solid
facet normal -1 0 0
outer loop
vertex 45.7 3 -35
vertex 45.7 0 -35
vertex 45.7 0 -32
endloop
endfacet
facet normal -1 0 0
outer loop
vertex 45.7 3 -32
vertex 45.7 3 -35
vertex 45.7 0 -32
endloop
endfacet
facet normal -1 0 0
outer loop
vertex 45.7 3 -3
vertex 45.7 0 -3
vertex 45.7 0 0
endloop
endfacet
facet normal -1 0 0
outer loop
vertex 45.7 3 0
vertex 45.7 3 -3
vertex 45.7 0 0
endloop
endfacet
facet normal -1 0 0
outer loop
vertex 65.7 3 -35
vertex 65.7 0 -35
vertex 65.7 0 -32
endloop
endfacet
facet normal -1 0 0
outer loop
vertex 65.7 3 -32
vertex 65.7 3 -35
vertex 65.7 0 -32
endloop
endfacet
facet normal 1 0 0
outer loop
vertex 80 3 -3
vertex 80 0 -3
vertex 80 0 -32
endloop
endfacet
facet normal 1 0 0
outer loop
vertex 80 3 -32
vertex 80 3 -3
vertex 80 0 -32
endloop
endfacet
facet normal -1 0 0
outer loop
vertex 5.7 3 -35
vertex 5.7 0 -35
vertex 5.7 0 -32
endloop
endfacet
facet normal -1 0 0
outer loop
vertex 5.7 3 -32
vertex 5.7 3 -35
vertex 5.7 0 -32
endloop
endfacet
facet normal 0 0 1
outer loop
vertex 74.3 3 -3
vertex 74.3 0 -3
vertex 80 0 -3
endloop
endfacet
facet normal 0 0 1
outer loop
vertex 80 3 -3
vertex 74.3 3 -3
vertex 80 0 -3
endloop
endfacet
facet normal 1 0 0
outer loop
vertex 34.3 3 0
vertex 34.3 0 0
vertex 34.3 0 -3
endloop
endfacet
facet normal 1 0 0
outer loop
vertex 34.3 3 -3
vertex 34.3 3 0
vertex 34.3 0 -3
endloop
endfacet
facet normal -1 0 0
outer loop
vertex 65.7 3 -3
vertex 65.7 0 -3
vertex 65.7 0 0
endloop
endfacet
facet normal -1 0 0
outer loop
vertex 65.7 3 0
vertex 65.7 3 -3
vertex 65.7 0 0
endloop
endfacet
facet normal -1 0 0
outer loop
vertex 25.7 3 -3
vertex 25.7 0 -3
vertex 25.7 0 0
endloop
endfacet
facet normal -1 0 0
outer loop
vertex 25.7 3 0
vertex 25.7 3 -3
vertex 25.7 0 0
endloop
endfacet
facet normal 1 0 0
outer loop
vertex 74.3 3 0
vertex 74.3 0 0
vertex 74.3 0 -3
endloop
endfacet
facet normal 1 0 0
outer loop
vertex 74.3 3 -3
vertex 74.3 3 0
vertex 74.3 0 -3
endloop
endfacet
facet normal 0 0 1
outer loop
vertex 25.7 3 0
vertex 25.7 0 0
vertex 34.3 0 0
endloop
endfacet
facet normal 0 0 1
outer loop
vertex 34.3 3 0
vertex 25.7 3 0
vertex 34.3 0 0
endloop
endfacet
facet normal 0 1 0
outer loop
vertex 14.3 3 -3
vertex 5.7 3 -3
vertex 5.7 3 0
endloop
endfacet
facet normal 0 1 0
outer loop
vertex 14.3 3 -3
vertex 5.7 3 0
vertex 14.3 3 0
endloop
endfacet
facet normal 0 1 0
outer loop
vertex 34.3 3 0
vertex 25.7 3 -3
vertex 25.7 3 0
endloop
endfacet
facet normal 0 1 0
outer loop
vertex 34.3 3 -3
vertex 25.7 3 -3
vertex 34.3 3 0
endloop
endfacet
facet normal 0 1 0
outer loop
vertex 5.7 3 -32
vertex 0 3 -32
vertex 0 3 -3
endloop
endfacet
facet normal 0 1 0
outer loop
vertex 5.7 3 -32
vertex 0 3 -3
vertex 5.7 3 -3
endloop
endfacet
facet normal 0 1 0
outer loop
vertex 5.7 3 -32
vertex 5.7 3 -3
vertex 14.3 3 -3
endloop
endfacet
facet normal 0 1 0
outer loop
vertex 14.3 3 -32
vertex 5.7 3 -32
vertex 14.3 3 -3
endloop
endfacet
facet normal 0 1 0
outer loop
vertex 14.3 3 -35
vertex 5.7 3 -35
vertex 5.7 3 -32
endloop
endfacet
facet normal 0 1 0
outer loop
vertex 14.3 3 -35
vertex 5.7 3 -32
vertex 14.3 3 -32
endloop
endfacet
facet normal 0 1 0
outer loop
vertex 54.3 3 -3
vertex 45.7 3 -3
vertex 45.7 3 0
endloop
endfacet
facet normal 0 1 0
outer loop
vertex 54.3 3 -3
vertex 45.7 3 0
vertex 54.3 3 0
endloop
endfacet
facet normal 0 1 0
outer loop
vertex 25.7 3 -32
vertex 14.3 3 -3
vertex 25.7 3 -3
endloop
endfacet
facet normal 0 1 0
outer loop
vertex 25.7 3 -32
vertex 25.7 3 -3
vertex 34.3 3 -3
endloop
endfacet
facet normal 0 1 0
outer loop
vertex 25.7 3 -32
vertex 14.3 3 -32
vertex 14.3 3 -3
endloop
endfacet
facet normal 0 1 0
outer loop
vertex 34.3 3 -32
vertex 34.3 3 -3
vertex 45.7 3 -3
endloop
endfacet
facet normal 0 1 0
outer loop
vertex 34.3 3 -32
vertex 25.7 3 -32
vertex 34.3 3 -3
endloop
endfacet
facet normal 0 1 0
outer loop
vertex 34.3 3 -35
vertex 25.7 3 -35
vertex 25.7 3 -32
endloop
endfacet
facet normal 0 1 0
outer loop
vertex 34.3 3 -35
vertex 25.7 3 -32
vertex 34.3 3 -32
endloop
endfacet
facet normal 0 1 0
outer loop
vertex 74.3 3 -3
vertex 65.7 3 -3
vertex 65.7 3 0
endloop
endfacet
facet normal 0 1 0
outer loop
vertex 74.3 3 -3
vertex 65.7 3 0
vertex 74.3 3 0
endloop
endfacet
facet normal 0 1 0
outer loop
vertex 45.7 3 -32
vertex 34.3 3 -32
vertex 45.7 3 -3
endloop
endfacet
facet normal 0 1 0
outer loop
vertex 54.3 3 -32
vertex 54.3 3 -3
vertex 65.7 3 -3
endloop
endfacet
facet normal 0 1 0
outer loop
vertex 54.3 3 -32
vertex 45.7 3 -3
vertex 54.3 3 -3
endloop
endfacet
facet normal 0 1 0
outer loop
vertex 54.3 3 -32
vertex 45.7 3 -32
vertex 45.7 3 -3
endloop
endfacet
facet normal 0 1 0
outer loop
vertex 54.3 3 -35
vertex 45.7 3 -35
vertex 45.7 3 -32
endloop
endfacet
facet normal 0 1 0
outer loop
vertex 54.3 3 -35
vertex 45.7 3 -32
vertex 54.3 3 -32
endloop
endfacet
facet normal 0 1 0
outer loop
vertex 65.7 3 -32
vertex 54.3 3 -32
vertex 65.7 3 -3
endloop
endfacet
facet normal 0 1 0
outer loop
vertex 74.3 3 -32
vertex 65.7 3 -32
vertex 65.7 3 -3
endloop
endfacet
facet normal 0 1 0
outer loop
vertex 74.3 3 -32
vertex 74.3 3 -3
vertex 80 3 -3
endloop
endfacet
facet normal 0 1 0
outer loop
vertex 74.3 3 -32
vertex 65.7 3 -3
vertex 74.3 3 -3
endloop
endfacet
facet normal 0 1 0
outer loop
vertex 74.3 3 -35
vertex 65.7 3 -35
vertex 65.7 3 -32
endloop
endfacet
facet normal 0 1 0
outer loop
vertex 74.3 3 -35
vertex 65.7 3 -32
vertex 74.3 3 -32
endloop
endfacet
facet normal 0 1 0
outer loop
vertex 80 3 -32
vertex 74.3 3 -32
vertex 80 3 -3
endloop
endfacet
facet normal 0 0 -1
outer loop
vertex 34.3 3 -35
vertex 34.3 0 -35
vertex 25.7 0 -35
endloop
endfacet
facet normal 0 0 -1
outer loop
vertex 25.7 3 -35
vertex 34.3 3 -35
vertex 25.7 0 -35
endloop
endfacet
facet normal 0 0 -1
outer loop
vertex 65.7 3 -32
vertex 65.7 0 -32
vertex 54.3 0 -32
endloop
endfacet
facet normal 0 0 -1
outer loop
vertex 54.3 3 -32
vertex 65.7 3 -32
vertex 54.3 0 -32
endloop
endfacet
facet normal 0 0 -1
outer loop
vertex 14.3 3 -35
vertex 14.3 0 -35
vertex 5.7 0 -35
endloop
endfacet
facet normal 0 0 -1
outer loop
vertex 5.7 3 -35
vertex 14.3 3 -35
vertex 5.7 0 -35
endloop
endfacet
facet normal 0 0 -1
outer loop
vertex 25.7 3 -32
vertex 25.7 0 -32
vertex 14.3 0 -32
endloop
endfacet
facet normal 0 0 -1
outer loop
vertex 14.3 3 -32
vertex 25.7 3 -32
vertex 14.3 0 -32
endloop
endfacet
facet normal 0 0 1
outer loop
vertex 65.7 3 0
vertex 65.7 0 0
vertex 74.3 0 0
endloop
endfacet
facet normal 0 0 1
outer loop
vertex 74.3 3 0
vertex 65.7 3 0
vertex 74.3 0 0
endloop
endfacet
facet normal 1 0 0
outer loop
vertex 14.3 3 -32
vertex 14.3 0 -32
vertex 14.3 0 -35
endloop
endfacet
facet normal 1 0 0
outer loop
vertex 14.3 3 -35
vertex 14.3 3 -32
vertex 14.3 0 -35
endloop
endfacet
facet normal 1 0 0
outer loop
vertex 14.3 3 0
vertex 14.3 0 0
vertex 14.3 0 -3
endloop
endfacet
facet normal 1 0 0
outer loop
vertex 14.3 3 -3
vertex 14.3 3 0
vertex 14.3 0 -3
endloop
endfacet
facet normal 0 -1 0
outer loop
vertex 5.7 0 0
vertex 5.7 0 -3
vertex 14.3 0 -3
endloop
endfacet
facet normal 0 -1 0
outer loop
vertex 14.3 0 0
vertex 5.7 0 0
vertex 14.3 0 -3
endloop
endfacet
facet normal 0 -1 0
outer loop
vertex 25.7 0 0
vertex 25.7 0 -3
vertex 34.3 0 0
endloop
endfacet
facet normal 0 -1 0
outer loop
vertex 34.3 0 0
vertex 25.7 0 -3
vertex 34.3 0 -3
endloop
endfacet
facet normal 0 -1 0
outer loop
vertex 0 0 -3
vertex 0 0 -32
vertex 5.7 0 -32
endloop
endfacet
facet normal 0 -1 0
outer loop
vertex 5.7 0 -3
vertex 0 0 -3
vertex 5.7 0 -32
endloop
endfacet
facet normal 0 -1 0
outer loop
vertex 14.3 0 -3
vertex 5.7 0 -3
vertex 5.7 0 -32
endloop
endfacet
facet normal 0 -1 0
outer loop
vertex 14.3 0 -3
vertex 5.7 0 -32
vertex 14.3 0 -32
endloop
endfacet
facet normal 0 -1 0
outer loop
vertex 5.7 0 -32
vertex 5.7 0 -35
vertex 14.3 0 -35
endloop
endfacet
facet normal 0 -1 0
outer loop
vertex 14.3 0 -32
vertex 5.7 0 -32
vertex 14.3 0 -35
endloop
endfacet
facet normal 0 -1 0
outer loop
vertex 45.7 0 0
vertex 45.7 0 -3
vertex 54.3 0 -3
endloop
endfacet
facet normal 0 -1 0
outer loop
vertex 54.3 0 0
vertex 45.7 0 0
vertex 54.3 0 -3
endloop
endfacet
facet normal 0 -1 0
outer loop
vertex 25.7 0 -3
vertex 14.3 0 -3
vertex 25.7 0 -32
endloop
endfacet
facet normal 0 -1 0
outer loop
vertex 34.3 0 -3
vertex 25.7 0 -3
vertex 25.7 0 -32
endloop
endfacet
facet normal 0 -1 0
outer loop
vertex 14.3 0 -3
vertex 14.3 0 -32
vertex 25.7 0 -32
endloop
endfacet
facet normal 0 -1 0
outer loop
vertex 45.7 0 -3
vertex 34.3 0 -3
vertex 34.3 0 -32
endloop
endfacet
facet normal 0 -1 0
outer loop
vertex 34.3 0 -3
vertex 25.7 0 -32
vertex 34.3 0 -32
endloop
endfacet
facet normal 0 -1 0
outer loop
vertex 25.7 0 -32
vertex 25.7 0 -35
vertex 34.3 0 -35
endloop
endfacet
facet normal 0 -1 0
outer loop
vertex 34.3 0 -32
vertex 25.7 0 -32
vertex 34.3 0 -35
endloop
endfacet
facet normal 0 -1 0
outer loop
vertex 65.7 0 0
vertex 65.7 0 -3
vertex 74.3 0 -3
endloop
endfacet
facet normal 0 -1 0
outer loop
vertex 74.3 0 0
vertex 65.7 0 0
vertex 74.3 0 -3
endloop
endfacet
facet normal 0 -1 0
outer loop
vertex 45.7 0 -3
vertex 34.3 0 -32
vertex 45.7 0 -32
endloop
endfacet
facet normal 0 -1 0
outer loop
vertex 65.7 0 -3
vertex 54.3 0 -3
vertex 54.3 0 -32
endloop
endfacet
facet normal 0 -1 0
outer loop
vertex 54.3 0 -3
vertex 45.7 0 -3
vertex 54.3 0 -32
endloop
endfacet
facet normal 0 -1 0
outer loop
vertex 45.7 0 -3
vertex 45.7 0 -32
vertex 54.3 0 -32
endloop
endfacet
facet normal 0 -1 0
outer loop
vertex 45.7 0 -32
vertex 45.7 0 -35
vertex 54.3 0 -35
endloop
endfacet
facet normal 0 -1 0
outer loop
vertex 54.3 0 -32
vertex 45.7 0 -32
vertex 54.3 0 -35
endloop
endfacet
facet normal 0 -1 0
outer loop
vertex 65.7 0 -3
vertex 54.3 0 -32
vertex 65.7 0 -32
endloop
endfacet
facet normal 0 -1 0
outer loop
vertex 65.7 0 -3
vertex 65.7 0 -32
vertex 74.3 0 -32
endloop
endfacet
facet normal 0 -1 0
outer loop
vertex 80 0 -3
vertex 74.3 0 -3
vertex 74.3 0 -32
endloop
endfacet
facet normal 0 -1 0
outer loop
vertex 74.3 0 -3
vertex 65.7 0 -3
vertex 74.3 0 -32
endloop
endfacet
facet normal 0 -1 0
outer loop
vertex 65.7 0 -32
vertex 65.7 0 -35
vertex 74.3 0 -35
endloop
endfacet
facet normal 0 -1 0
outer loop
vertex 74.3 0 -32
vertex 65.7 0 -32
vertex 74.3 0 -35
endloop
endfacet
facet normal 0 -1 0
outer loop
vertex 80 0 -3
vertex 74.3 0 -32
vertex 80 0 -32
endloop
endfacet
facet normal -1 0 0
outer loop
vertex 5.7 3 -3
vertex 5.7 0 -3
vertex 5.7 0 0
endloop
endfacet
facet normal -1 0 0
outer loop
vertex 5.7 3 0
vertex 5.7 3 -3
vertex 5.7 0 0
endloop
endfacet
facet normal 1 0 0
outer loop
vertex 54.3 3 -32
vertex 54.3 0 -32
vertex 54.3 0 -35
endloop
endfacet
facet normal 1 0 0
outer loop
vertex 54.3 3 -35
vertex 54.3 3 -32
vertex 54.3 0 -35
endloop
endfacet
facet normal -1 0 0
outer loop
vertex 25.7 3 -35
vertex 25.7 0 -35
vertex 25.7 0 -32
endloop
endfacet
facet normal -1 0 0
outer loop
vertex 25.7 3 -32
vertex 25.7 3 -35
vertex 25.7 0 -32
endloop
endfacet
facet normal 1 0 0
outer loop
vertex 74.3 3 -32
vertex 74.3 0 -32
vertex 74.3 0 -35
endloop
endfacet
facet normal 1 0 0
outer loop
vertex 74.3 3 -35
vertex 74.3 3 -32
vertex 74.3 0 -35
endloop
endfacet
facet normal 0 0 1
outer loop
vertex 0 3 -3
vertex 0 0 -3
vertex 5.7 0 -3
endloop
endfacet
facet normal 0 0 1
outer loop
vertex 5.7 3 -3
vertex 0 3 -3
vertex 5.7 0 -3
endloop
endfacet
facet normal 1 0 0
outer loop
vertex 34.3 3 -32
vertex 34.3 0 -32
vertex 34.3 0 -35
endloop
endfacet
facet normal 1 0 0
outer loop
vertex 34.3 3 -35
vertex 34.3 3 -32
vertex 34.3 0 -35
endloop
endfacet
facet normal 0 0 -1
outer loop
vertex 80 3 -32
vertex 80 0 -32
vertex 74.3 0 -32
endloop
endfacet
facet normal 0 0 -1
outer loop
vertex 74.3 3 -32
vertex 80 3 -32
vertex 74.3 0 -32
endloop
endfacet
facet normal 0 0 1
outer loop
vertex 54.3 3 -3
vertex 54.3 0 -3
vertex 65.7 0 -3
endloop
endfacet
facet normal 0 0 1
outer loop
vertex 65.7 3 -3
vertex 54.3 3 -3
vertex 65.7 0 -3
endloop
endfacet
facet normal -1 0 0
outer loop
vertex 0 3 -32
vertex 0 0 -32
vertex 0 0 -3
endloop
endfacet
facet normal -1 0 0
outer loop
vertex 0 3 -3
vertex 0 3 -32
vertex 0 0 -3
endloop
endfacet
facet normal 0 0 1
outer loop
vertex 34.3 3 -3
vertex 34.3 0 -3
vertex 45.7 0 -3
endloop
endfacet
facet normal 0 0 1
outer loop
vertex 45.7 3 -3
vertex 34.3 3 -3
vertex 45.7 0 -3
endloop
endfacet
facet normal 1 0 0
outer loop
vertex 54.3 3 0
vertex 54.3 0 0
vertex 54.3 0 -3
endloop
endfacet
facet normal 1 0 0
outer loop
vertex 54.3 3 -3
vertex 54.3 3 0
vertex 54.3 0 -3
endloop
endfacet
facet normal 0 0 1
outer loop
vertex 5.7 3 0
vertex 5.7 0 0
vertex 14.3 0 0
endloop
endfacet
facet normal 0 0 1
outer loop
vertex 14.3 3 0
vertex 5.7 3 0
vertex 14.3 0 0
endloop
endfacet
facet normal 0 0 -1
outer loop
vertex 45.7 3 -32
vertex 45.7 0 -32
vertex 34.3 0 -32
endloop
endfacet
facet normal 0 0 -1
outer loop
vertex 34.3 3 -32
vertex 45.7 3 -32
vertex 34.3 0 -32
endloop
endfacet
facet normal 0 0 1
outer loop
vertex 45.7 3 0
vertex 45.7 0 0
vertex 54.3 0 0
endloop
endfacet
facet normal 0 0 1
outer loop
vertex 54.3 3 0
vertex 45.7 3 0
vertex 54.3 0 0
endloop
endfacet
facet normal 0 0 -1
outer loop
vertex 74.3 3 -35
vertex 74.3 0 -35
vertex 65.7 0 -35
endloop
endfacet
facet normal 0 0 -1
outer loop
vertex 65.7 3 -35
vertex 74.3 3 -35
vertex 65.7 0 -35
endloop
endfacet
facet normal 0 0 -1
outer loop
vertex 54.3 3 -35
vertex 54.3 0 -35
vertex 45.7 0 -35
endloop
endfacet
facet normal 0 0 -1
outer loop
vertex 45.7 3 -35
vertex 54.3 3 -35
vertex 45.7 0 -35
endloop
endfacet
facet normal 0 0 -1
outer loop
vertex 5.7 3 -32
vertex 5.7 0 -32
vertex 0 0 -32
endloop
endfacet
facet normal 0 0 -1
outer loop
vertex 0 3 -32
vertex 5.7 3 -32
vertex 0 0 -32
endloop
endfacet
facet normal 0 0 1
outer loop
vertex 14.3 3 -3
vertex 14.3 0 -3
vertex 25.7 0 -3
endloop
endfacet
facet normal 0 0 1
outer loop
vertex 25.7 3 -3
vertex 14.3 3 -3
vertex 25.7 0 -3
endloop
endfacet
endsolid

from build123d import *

# Parameters (mm, degrees)
BOSS_EXTRU_1_DEPTH = 3


with BuildPart() as part:
    # Esquisse1 → Boss.-Extru.1 (new body)
    with BuildSketch(Plane(origin=(0, 0, 0), x_dir=(1, 0, 0), z_dir=(0, 1, 0))):
        Polygon((25.7, 3), (25.7, 0), (34.3, 0), (34.3, 3), (45.7, 3), (45.7, 0), (54.3, 0), (54.3, 3), (65.7, 3), (65.7, 0), (74.3, 0), (74.3, 3), (80, 3), (80, 32), (74.3, 32), (74.3, 35), (65.7, 35), (65.7, 32), (54.3, 32), (54.3, 35), (45.7, 35), (45.7, 32), (34.3, 32), (34.3, 35), (25.7, 35), (25.7, 32), (14.3, 32), (14.3, 35), (5.7, 35), (5.7, 32), (0, 32), (0, 3), (5.7, 3), (5.7, 0), (14.3, 0), (14.3, 3), align=None)
    extrude(amount=BOSS_EXTRU_1_DEPTH)


solid = part.part
